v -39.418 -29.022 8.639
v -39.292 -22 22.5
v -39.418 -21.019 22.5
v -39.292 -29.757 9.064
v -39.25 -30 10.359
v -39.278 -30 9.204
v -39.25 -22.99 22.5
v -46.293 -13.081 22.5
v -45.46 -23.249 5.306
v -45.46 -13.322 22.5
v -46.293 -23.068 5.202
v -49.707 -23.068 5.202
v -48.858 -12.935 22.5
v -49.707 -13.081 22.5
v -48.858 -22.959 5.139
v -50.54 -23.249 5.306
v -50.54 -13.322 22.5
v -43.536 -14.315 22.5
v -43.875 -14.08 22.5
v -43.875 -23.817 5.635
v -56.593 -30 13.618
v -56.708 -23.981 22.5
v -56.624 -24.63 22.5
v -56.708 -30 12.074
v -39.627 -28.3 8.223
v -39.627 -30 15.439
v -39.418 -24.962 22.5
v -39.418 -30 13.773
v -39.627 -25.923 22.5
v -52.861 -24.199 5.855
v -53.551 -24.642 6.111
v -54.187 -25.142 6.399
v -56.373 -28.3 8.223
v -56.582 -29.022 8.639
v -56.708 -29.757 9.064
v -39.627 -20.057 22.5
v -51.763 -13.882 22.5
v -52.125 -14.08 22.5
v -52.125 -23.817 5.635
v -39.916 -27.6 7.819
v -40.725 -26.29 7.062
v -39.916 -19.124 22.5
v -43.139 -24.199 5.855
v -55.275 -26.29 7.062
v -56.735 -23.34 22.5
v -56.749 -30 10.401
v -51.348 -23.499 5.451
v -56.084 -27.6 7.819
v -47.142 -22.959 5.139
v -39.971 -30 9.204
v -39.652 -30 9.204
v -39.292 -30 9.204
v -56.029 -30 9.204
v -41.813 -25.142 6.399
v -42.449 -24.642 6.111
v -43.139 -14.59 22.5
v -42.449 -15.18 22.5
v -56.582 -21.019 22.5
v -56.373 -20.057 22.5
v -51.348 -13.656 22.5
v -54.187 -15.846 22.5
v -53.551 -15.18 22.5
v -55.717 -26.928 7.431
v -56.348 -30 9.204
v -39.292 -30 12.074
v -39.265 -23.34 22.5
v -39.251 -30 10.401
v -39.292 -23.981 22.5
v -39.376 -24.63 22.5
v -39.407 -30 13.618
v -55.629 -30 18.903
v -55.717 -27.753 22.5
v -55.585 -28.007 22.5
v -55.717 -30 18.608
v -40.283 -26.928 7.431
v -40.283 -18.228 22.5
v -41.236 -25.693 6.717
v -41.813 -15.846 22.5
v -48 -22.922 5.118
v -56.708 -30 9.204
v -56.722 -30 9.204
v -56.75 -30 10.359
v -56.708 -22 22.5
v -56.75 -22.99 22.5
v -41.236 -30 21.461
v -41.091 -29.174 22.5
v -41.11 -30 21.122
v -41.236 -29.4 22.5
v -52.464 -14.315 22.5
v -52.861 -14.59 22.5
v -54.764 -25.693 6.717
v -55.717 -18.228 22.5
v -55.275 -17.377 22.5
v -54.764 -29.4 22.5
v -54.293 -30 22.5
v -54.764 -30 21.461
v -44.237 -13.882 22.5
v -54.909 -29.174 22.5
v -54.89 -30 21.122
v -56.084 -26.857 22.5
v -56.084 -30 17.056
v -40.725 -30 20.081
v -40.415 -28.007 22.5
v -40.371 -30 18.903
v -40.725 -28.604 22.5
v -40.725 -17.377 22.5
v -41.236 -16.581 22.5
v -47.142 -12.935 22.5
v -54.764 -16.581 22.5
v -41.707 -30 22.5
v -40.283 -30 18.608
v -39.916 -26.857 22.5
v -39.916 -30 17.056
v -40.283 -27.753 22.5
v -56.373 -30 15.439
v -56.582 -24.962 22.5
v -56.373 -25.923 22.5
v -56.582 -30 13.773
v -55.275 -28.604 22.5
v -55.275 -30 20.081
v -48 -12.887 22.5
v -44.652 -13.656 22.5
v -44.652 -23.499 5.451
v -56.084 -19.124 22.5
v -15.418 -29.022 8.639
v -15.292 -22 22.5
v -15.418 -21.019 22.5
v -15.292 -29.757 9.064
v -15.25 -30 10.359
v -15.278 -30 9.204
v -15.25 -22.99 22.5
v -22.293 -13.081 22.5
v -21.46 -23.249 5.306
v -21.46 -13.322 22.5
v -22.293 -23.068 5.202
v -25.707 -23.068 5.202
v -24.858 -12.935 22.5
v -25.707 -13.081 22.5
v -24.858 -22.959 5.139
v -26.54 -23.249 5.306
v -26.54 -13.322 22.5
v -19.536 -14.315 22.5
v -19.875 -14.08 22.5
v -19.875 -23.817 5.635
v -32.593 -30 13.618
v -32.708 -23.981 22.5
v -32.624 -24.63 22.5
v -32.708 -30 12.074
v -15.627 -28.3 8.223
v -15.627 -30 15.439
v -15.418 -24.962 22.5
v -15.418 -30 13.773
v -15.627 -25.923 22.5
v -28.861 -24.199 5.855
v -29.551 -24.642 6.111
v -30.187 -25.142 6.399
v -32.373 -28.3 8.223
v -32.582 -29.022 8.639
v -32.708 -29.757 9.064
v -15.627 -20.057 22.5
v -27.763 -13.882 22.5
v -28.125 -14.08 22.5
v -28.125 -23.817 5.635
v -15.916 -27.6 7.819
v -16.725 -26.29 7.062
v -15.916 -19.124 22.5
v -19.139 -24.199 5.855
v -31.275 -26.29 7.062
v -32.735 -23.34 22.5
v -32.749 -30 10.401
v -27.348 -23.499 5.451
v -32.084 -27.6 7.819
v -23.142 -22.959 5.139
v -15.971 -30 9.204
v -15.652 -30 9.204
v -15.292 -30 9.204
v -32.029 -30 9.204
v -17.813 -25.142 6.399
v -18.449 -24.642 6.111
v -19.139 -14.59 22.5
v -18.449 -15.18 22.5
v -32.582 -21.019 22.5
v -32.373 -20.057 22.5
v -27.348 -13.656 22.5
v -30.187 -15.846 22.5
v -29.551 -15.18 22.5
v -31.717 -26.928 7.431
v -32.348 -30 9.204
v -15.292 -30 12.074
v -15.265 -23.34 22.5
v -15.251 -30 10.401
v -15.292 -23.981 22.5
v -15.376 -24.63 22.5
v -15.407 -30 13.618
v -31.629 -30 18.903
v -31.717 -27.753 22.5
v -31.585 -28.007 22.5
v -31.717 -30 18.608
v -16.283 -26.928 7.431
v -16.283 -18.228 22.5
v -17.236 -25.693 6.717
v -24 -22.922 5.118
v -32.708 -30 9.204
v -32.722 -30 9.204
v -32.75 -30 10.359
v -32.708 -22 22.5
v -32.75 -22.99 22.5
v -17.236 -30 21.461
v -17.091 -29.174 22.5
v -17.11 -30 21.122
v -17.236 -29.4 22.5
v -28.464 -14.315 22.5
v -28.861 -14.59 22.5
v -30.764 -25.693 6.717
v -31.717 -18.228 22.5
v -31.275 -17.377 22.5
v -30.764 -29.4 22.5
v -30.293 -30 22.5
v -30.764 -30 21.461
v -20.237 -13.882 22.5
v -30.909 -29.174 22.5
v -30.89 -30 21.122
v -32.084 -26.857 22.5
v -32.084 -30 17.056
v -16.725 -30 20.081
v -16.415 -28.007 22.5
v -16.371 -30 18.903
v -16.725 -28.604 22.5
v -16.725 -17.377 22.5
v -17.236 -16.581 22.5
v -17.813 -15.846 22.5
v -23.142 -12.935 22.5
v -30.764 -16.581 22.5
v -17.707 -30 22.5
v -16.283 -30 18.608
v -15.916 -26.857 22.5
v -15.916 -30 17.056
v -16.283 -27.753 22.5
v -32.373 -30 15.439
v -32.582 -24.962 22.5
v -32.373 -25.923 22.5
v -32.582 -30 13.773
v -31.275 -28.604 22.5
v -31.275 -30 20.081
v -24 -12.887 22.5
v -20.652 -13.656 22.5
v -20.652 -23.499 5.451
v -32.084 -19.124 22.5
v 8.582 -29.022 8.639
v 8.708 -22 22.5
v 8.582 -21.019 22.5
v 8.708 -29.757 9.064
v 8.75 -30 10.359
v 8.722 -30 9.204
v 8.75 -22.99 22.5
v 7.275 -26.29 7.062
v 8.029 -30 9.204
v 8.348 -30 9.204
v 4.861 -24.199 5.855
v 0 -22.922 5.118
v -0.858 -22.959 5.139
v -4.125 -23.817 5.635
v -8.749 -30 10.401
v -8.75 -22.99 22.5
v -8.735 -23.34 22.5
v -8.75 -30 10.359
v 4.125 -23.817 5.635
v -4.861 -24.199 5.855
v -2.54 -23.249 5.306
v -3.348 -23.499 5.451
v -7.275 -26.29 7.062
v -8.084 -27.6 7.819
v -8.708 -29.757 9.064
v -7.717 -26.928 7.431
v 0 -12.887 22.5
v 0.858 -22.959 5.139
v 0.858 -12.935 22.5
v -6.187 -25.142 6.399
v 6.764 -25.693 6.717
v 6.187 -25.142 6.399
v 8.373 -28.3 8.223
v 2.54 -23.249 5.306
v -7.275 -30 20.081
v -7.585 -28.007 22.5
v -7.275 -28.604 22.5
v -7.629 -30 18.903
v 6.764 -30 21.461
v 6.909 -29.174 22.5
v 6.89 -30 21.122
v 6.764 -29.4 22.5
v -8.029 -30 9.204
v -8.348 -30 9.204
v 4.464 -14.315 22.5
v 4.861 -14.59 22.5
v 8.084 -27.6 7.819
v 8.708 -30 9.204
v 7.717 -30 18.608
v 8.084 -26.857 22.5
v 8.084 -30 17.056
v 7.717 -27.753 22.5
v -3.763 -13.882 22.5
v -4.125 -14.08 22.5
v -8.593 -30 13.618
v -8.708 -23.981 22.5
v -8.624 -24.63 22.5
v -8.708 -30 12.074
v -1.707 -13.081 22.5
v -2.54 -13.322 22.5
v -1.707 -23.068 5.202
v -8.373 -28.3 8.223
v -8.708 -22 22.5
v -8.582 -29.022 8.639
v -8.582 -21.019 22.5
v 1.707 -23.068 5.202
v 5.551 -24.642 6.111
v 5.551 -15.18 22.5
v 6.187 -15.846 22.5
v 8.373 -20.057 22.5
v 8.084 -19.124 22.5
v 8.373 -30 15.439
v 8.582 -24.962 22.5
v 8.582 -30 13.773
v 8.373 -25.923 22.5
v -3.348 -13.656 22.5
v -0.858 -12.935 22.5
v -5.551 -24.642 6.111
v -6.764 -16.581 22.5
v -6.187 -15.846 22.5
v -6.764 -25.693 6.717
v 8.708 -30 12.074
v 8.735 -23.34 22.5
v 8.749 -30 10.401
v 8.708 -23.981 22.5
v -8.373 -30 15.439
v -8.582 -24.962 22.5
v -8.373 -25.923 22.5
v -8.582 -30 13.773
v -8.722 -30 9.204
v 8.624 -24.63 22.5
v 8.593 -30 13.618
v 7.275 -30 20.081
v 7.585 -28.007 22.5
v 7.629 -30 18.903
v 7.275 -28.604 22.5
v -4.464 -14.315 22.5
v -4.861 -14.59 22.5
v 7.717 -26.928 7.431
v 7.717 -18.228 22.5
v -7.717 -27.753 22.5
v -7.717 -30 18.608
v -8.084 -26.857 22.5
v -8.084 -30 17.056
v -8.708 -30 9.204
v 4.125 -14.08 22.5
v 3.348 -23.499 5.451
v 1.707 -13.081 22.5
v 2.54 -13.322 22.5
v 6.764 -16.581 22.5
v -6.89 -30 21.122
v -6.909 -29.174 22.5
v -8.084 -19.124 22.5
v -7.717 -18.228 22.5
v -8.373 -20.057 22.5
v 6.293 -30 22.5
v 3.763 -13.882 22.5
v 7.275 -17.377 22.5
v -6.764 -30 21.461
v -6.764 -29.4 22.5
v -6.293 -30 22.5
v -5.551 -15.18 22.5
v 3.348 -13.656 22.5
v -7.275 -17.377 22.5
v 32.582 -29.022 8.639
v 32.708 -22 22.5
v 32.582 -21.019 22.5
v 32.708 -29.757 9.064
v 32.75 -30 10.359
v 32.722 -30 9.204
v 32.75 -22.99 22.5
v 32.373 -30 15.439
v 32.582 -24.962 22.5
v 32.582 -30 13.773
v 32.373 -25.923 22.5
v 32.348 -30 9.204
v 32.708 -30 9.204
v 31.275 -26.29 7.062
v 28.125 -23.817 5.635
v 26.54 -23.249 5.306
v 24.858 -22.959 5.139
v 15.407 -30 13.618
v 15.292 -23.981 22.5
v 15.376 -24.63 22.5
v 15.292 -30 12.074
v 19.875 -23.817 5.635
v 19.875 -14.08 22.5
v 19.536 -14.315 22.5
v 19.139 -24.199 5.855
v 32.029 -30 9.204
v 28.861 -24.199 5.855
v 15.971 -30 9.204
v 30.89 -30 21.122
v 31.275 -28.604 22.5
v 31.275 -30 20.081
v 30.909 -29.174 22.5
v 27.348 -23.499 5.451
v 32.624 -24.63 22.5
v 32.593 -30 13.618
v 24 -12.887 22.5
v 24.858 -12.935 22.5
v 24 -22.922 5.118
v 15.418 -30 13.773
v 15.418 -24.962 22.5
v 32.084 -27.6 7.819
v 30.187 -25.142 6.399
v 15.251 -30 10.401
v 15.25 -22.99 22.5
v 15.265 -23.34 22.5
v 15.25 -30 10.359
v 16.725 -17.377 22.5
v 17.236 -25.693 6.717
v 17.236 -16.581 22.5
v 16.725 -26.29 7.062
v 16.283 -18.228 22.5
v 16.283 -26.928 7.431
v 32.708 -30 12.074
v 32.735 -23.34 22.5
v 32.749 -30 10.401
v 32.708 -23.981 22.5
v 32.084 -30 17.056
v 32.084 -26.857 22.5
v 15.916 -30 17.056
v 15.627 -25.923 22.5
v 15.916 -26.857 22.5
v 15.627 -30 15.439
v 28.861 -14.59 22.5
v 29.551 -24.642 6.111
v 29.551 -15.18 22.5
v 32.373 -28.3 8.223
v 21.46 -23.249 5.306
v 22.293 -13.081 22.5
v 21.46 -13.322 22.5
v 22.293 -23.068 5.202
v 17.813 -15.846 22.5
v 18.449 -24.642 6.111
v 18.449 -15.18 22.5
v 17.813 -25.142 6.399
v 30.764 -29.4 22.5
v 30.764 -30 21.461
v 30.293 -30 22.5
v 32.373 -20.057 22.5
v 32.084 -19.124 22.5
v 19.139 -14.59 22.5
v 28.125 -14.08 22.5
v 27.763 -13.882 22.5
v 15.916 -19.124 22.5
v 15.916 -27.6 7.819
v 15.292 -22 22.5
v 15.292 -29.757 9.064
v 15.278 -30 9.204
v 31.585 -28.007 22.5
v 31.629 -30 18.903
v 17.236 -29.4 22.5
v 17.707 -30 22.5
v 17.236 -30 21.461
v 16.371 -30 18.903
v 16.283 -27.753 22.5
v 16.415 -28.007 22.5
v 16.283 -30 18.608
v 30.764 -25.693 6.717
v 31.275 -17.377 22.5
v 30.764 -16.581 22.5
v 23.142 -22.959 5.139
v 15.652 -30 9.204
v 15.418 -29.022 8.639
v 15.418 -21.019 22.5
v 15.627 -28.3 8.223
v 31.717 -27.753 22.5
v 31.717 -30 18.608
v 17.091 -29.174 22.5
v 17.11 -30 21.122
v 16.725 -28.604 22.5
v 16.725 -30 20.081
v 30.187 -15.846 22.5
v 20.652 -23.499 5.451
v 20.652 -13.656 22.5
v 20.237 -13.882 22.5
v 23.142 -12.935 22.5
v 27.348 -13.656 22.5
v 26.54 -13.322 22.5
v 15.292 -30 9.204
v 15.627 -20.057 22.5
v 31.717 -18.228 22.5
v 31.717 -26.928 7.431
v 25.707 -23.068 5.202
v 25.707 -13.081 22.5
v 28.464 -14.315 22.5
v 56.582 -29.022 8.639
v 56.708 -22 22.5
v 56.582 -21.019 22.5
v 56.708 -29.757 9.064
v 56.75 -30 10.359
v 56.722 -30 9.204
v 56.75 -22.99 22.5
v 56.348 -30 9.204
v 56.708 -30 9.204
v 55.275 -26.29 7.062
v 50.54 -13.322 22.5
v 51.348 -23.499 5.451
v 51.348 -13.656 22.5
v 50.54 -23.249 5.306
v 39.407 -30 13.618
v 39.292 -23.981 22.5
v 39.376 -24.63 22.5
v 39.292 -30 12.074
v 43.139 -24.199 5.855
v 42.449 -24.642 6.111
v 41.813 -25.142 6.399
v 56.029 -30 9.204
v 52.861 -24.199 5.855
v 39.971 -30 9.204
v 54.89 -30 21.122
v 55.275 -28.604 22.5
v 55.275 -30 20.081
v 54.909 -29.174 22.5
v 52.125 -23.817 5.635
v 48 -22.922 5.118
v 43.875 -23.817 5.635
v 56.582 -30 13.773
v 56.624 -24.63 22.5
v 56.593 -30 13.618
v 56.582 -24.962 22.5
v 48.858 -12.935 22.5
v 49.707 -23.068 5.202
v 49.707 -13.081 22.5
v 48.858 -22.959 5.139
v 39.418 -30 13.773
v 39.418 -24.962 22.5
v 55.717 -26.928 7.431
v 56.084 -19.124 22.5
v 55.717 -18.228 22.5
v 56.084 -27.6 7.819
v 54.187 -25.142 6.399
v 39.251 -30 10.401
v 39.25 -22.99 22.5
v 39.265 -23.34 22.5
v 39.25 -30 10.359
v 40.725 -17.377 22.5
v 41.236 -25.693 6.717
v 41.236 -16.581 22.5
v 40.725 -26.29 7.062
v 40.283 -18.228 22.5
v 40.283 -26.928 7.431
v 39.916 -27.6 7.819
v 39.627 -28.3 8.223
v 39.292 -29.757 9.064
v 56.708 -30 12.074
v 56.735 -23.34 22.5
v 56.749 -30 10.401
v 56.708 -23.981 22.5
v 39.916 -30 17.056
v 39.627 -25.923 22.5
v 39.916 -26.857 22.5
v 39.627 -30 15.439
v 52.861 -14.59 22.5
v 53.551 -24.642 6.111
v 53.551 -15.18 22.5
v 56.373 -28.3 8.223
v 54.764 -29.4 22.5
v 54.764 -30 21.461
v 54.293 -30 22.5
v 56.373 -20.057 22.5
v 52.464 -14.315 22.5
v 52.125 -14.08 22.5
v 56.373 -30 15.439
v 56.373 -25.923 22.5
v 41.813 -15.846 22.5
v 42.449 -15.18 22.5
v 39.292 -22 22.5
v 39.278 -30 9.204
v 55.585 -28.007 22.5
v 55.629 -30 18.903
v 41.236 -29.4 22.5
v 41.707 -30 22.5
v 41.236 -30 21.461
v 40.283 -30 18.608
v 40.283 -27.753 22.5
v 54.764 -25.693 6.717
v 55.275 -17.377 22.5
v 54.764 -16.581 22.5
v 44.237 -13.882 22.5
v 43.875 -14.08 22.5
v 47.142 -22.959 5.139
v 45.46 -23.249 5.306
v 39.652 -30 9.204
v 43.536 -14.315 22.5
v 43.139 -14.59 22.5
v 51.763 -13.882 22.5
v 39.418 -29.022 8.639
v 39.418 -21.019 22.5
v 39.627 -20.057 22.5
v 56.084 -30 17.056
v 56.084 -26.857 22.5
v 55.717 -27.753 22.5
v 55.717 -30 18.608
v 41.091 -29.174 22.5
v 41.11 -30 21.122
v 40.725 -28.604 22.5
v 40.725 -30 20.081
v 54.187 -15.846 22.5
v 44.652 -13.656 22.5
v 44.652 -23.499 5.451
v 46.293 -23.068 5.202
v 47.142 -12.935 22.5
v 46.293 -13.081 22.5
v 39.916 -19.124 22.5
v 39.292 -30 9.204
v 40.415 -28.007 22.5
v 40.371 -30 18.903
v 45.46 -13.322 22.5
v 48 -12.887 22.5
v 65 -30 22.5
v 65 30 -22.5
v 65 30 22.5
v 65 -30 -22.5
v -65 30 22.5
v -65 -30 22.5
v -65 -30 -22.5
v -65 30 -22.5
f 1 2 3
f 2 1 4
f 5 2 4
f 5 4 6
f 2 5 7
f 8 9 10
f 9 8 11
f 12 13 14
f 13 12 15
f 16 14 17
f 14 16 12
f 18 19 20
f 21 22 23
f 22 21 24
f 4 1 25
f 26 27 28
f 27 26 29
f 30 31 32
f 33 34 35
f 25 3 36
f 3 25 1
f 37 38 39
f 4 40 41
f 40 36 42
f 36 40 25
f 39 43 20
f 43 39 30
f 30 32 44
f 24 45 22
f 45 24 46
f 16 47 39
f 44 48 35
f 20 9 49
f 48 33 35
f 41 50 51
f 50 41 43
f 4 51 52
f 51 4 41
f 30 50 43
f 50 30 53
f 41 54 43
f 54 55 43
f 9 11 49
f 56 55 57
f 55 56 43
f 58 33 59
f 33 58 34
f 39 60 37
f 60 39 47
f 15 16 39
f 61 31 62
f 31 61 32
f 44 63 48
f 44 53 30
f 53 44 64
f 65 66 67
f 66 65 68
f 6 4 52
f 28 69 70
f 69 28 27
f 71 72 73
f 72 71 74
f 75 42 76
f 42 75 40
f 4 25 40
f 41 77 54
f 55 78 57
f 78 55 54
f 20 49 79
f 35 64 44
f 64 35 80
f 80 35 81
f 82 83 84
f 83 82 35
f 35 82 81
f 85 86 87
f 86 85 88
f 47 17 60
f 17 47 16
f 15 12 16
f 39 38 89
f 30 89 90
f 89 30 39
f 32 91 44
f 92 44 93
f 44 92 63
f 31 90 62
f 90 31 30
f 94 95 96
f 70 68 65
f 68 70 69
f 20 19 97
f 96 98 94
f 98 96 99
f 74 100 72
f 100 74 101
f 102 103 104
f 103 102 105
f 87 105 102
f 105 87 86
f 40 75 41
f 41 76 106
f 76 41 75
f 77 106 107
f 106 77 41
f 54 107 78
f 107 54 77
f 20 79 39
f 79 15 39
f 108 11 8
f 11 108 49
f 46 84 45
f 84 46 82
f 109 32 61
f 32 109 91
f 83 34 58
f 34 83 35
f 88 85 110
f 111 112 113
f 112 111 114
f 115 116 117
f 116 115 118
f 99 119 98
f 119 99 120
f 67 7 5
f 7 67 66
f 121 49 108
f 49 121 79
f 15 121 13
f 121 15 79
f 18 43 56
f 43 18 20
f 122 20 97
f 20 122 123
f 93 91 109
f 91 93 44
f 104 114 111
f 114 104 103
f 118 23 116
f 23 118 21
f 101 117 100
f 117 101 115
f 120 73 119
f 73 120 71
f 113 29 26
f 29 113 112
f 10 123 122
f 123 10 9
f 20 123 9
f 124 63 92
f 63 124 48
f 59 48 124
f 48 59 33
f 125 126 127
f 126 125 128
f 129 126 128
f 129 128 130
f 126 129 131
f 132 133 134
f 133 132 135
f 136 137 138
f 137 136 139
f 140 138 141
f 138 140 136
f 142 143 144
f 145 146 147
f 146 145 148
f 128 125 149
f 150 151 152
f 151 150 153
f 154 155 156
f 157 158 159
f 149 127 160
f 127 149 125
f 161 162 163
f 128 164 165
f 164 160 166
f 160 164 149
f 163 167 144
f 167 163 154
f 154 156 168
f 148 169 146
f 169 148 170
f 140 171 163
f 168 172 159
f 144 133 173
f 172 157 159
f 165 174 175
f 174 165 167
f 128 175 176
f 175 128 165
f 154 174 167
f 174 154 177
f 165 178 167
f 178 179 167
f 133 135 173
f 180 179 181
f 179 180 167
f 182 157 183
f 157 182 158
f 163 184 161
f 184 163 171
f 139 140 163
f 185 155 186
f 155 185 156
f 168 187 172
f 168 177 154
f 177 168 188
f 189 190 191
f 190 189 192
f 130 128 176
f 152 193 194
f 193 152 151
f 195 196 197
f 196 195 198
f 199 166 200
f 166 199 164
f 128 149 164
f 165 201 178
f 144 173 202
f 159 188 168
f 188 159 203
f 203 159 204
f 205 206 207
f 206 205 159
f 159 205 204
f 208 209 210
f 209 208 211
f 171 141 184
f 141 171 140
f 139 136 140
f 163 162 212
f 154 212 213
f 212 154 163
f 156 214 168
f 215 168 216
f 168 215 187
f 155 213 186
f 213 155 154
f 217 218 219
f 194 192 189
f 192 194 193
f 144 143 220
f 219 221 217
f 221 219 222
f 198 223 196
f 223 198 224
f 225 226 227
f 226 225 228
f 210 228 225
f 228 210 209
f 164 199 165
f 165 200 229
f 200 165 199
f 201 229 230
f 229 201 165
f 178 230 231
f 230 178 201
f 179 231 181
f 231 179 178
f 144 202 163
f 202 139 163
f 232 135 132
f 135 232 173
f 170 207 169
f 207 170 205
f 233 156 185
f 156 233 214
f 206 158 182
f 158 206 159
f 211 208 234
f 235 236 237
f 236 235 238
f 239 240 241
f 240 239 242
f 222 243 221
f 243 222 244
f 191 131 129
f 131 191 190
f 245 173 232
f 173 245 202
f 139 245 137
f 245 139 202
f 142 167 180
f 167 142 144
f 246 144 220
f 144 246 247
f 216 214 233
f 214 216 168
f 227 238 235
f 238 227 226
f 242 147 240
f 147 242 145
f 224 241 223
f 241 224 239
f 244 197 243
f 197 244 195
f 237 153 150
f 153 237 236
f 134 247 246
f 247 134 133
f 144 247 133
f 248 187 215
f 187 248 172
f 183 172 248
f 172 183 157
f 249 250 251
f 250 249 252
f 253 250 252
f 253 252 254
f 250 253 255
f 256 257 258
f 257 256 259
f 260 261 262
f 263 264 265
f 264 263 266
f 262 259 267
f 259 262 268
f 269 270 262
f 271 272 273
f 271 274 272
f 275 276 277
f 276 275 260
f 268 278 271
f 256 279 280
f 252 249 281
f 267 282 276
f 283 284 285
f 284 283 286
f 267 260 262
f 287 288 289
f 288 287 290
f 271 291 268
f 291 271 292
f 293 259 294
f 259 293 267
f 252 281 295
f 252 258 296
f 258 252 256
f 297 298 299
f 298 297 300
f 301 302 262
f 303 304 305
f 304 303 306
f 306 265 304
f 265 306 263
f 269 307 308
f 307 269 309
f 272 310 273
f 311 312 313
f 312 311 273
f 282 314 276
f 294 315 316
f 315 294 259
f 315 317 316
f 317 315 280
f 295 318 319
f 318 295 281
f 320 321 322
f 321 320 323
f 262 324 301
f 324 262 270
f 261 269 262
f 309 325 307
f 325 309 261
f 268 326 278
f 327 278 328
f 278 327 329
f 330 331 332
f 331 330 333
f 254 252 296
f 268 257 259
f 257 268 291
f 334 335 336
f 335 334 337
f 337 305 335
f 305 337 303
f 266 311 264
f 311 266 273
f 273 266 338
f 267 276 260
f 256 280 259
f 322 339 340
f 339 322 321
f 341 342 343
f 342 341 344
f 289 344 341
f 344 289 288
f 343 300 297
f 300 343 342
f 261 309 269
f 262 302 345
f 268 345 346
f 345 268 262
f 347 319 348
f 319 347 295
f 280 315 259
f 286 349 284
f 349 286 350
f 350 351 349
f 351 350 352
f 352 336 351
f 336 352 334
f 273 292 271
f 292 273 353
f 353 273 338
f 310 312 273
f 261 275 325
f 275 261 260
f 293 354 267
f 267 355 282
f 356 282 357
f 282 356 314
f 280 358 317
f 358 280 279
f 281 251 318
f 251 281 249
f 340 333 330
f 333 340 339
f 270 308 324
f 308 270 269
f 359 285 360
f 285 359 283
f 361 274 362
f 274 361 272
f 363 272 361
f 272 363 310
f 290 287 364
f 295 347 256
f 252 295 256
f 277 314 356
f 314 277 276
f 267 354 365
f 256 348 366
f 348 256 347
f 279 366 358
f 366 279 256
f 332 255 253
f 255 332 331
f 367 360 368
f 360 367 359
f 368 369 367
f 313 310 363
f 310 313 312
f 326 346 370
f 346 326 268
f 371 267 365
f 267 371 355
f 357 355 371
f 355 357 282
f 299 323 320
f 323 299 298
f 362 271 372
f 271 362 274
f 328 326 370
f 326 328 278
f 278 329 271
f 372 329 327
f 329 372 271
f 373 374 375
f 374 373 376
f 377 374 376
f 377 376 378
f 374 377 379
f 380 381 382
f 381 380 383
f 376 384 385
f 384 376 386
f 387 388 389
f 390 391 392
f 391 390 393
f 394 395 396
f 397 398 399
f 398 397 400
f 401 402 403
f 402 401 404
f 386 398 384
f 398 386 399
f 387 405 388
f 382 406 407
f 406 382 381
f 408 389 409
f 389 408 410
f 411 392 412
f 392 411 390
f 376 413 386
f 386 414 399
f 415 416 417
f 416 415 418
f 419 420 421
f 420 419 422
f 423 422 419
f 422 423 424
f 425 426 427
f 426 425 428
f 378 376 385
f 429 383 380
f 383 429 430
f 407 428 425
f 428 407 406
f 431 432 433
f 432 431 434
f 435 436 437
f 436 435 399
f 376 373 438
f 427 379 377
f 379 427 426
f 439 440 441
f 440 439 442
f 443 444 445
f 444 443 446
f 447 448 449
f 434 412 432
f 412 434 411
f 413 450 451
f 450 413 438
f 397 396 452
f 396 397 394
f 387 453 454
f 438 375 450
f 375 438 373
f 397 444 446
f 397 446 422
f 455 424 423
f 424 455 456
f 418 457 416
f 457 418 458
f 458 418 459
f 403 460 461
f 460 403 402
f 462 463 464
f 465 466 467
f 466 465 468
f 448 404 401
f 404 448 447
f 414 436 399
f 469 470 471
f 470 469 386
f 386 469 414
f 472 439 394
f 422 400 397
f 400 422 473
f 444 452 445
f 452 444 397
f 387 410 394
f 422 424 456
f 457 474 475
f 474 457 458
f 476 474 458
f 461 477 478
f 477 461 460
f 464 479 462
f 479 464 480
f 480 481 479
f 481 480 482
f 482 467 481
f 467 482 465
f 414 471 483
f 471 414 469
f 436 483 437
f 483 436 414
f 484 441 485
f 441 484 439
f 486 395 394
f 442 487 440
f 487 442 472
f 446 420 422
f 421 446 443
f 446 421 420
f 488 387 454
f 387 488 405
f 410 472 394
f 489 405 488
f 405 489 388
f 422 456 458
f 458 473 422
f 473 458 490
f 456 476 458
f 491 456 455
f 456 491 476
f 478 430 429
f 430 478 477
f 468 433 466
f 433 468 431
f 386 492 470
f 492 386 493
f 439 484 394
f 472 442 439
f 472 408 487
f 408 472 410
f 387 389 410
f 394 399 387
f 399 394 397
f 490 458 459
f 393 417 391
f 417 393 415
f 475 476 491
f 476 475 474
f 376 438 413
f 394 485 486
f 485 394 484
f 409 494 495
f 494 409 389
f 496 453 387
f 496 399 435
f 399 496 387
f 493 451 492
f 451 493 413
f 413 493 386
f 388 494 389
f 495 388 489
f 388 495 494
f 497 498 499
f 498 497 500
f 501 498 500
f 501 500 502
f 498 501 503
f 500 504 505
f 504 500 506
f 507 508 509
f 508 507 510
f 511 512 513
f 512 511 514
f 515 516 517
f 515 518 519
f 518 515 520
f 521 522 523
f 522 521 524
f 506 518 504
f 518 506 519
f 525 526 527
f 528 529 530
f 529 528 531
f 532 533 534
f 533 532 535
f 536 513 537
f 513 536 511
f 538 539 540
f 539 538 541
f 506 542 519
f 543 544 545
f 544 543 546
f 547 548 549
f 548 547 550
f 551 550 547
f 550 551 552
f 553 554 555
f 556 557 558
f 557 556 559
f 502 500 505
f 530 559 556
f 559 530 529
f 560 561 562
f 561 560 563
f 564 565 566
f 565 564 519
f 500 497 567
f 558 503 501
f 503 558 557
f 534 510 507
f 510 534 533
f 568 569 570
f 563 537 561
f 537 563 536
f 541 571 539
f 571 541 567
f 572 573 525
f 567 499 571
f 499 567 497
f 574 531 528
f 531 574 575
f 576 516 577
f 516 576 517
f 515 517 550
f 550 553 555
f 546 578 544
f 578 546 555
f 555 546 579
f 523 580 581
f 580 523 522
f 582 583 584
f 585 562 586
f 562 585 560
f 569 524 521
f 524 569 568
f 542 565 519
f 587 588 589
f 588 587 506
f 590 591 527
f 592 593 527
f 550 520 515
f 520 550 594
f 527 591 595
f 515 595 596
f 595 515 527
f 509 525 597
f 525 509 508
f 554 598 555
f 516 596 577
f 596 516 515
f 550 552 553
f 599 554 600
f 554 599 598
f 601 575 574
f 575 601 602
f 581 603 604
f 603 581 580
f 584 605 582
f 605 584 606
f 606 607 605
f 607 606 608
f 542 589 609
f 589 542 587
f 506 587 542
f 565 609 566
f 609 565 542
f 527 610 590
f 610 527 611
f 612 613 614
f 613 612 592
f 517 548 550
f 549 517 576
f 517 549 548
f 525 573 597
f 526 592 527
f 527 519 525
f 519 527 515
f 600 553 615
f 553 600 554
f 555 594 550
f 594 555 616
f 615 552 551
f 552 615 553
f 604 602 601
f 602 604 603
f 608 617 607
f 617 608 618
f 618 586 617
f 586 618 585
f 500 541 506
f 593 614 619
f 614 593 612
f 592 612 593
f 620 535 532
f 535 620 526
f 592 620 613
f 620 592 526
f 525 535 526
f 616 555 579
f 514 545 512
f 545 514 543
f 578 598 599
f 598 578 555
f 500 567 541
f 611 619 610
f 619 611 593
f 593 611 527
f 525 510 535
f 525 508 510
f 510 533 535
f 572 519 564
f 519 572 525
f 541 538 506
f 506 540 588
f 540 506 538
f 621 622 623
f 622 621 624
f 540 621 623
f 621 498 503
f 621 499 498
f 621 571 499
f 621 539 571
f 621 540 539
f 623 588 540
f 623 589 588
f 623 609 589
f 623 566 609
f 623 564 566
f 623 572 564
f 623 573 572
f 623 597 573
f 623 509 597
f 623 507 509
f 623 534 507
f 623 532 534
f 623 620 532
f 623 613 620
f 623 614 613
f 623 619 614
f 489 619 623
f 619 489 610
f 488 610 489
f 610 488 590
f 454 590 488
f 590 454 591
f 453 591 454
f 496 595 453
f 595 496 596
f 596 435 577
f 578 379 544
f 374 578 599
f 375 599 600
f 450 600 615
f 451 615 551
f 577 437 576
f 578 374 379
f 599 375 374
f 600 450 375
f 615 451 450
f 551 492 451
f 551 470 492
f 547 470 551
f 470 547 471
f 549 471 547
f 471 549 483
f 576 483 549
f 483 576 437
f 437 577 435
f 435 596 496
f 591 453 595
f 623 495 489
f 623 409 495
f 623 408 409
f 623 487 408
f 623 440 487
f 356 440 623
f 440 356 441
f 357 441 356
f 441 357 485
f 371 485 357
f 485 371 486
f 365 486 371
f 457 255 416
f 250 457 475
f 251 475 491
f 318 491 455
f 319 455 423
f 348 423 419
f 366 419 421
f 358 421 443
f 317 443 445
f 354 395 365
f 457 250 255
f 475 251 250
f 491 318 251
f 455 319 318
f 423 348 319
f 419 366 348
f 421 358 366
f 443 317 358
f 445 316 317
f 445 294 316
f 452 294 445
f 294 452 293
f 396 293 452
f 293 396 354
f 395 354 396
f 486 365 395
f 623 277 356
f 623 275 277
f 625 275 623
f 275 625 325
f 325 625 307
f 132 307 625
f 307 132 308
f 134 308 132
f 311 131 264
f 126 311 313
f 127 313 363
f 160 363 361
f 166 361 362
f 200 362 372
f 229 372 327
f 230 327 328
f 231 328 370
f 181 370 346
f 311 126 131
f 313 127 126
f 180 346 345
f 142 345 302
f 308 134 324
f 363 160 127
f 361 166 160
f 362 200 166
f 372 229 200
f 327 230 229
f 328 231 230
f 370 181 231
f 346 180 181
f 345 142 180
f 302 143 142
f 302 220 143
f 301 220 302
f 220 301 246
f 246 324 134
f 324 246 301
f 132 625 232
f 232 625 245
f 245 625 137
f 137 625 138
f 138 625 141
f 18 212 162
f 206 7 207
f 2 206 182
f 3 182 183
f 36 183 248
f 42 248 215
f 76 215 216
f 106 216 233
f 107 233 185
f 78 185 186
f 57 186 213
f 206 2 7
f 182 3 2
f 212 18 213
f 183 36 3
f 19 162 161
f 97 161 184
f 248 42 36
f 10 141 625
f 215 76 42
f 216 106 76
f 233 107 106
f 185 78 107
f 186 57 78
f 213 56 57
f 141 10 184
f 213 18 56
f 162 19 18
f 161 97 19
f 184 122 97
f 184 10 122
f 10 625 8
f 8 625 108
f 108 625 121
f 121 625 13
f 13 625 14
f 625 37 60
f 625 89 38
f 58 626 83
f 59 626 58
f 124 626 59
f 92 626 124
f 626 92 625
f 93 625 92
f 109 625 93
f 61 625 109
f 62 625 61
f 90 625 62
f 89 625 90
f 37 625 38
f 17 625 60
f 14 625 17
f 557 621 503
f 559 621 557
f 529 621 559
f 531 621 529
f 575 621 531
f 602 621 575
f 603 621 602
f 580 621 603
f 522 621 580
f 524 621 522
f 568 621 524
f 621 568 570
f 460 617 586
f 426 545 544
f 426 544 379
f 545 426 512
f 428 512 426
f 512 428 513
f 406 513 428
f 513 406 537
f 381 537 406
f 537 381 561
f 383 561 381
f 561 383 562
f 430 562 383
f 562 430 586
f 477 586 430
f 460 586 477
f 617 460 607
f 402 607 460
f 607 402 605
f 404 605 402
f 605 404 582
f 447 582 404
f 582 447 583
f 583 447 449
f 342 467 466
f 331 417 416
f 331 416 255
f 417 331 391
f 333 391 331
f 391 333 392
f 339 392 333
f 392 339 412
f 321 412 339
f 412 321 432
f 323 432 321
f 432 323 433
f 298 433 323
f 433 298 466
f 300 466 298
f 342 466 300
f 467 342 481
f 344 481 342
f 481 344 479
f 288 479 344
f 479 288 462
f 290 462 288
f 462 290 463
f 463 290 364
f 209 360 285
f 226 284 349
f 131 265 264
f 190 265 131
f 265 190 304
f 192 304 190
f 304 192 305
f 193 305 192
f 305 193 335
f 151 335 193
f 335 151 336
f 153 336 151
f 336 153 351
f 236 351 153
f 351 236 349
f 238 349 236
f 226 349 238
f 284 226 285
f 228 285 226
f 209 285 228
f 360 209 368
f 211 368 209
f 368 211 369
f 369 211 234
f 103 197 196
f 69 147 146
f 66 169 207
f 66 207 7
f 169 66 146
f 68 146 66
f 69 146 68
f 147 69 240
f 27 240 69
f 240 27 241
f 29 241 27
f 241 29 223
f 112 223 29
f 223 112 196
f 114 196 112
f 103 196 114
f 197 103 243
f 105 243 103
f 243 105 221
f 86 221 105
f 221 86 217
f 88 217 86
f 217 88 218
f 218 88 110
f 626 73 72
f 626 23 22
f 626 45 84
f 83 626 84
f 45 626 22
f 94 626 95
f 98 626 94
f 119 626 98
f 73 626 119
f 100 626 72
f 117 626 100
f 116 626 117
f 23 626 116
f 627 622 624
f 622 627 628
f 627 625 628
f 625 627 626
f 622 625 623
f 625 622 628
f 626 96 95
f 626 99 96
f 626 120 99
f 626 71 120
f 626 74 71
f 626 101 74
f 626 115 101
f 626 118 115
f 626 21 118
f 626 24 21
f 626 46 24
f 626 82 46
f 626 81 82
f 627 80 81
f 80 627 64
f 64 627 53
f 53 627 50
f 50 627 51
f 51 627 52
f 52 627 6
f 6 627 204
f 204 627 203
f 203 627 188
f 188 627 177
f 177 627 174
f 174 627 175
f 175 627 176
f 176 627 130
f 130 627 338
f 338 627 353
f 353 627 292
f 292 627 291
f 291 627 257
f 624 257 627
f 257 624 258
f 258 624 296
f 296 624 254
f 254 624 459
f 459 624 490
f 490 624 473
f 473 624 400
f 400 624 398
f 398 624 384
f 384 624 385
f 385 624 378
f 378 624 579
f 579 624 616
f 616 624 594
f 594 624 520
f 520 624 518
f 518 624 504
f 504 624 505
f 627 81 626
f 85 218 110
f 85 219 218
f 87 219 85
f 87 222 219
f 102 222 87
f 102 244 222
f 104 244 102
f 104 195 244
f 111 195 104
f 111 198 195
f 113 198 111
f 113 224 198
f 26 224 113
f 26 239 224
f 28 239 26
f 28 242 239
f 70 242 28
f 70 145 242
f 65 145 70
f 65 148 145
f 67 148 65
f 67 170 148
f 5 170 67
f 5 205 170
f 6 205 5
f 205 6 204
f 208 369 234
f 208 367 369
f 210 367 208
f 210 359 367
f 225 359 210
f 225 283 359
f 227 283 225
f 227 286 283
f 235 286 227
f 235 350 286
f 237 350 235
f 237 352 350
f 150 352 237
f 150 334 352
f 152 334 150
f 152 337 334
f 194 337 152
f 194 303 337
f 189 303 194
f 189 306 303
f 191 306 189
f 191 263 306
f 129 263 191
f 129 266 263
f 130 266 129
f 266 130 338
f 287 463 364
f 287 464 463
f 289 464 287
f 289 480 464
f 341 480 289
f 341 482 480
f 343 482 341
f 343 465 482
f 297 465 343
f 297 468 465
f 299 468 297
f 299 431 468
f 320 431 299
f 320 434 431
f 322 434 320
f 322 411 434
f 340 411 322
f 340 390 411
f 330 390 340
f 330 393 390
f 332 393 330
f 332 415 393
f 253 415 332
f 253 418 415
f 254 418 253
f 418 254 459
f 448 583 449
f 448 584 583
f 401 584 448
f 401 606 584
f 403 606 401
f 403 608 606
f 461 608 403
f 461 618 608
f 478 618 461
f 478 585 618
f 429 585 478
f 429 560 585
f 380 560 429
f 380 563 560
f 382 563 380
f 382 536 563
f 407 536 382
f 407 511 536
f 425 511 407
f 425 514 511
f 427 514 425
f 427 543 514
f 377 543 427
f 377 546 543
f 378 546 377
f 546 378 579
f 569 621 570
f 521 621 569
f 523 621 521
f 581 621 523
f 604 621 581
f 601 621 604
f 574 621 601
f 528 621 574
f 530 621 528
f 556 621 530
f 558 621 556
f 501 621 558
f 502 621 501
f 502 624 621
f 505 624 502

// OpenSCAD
// --- Parameters ---
// Block dimensions
block_x = 130;           // Total length (X)
block_y = 60;            // Total depth (Y)
block_z = 45;            // Total height (Z)

// Hole properties
hole_diameter = 17.5;    // Diameter of the conical tube hole
hole_depth = 40;         // Depth of the hole along its axis
num_holes = 5;           // Number of tubes
hole_spacing = 24;       // Distance between hole centers along X

// Tilt properties
tilt_angle = 30;         // Angle from vertical in YZ plane
tilt_y_offset = -10;      // Y-coordinate where the hole axis meets the top face

// Resolution
fn_val = 64;             // Smoothness for cylinders

// --- Calculations ---
// Center the block on X and Y, resting on Z=0
origin_x = 0;
origin_y = 0;
origin_z = 0;

// Calculate the starting X position for the first hole to ensure the set is centered
// Total span of holes = (num_holes - 1) * hole_spacing
hole_span = (num_holes - 1) * hole_spacing;
first_hole_x = -hole_span / 2;

// --- Modeling ---

// Main Block
difference() {
    // The solid block
    translate([origin_x, origin_y, origin_z])
        cube([block_x, block_y, block_z], center = true);

    // The five blind holes
    for (i = [0 : num_holes - 1]) {
        // Calculate X position for this specific hole
        current_hole_x = first_hole_x + (i * hole_spacing);
        
        // The hole axis is tilted 30 degrees from vertical in the YZ plane.
        // "Going down into the block, it moves toward +Y"
        // This means the rotation is around the X axis.
        // A 30 degree tilt from vertical (Z) towards +Y means the axis vector 
        // in YZ plane is (sin(30), -cos(30)).
        // However, OpenSCAD rotation is around the axis. 
        // To tilt a cylinder that is standing upright (Z) towards +Y:
        // We rotate the cylinder around the X axis by 30 degrees.
        // Since we want it to move towards +Y as it goes down, 
        // we rotate by -30 degrees if using standard coordinate rotation logic,
        // but let's define the rotation clearly:
        // A rotation of 30 degrees around X moves the +Z axis towards the +Y axis.
        
        translate([current_hole_x, tilt_y_offset, block_z]) // Move to top face and X position
        rotate([-tilt_angle, 0, 0]) // Tilt towards +Y as it goes down
        translate([0, 0, -hole_depth - 1]) // Move down so the "top" of the cylinder is at the face
        cylinder(h = hole_depth + 2, d = hole_diameter, $fn = fn_val);
    }
}

// Note on orientation:
// The block is centered on X and Y. 
// The cube is created with center=true, so it spans [-65, 65] in X and [-30, 30] in Y.
// The holes are subtracted from this volume.
